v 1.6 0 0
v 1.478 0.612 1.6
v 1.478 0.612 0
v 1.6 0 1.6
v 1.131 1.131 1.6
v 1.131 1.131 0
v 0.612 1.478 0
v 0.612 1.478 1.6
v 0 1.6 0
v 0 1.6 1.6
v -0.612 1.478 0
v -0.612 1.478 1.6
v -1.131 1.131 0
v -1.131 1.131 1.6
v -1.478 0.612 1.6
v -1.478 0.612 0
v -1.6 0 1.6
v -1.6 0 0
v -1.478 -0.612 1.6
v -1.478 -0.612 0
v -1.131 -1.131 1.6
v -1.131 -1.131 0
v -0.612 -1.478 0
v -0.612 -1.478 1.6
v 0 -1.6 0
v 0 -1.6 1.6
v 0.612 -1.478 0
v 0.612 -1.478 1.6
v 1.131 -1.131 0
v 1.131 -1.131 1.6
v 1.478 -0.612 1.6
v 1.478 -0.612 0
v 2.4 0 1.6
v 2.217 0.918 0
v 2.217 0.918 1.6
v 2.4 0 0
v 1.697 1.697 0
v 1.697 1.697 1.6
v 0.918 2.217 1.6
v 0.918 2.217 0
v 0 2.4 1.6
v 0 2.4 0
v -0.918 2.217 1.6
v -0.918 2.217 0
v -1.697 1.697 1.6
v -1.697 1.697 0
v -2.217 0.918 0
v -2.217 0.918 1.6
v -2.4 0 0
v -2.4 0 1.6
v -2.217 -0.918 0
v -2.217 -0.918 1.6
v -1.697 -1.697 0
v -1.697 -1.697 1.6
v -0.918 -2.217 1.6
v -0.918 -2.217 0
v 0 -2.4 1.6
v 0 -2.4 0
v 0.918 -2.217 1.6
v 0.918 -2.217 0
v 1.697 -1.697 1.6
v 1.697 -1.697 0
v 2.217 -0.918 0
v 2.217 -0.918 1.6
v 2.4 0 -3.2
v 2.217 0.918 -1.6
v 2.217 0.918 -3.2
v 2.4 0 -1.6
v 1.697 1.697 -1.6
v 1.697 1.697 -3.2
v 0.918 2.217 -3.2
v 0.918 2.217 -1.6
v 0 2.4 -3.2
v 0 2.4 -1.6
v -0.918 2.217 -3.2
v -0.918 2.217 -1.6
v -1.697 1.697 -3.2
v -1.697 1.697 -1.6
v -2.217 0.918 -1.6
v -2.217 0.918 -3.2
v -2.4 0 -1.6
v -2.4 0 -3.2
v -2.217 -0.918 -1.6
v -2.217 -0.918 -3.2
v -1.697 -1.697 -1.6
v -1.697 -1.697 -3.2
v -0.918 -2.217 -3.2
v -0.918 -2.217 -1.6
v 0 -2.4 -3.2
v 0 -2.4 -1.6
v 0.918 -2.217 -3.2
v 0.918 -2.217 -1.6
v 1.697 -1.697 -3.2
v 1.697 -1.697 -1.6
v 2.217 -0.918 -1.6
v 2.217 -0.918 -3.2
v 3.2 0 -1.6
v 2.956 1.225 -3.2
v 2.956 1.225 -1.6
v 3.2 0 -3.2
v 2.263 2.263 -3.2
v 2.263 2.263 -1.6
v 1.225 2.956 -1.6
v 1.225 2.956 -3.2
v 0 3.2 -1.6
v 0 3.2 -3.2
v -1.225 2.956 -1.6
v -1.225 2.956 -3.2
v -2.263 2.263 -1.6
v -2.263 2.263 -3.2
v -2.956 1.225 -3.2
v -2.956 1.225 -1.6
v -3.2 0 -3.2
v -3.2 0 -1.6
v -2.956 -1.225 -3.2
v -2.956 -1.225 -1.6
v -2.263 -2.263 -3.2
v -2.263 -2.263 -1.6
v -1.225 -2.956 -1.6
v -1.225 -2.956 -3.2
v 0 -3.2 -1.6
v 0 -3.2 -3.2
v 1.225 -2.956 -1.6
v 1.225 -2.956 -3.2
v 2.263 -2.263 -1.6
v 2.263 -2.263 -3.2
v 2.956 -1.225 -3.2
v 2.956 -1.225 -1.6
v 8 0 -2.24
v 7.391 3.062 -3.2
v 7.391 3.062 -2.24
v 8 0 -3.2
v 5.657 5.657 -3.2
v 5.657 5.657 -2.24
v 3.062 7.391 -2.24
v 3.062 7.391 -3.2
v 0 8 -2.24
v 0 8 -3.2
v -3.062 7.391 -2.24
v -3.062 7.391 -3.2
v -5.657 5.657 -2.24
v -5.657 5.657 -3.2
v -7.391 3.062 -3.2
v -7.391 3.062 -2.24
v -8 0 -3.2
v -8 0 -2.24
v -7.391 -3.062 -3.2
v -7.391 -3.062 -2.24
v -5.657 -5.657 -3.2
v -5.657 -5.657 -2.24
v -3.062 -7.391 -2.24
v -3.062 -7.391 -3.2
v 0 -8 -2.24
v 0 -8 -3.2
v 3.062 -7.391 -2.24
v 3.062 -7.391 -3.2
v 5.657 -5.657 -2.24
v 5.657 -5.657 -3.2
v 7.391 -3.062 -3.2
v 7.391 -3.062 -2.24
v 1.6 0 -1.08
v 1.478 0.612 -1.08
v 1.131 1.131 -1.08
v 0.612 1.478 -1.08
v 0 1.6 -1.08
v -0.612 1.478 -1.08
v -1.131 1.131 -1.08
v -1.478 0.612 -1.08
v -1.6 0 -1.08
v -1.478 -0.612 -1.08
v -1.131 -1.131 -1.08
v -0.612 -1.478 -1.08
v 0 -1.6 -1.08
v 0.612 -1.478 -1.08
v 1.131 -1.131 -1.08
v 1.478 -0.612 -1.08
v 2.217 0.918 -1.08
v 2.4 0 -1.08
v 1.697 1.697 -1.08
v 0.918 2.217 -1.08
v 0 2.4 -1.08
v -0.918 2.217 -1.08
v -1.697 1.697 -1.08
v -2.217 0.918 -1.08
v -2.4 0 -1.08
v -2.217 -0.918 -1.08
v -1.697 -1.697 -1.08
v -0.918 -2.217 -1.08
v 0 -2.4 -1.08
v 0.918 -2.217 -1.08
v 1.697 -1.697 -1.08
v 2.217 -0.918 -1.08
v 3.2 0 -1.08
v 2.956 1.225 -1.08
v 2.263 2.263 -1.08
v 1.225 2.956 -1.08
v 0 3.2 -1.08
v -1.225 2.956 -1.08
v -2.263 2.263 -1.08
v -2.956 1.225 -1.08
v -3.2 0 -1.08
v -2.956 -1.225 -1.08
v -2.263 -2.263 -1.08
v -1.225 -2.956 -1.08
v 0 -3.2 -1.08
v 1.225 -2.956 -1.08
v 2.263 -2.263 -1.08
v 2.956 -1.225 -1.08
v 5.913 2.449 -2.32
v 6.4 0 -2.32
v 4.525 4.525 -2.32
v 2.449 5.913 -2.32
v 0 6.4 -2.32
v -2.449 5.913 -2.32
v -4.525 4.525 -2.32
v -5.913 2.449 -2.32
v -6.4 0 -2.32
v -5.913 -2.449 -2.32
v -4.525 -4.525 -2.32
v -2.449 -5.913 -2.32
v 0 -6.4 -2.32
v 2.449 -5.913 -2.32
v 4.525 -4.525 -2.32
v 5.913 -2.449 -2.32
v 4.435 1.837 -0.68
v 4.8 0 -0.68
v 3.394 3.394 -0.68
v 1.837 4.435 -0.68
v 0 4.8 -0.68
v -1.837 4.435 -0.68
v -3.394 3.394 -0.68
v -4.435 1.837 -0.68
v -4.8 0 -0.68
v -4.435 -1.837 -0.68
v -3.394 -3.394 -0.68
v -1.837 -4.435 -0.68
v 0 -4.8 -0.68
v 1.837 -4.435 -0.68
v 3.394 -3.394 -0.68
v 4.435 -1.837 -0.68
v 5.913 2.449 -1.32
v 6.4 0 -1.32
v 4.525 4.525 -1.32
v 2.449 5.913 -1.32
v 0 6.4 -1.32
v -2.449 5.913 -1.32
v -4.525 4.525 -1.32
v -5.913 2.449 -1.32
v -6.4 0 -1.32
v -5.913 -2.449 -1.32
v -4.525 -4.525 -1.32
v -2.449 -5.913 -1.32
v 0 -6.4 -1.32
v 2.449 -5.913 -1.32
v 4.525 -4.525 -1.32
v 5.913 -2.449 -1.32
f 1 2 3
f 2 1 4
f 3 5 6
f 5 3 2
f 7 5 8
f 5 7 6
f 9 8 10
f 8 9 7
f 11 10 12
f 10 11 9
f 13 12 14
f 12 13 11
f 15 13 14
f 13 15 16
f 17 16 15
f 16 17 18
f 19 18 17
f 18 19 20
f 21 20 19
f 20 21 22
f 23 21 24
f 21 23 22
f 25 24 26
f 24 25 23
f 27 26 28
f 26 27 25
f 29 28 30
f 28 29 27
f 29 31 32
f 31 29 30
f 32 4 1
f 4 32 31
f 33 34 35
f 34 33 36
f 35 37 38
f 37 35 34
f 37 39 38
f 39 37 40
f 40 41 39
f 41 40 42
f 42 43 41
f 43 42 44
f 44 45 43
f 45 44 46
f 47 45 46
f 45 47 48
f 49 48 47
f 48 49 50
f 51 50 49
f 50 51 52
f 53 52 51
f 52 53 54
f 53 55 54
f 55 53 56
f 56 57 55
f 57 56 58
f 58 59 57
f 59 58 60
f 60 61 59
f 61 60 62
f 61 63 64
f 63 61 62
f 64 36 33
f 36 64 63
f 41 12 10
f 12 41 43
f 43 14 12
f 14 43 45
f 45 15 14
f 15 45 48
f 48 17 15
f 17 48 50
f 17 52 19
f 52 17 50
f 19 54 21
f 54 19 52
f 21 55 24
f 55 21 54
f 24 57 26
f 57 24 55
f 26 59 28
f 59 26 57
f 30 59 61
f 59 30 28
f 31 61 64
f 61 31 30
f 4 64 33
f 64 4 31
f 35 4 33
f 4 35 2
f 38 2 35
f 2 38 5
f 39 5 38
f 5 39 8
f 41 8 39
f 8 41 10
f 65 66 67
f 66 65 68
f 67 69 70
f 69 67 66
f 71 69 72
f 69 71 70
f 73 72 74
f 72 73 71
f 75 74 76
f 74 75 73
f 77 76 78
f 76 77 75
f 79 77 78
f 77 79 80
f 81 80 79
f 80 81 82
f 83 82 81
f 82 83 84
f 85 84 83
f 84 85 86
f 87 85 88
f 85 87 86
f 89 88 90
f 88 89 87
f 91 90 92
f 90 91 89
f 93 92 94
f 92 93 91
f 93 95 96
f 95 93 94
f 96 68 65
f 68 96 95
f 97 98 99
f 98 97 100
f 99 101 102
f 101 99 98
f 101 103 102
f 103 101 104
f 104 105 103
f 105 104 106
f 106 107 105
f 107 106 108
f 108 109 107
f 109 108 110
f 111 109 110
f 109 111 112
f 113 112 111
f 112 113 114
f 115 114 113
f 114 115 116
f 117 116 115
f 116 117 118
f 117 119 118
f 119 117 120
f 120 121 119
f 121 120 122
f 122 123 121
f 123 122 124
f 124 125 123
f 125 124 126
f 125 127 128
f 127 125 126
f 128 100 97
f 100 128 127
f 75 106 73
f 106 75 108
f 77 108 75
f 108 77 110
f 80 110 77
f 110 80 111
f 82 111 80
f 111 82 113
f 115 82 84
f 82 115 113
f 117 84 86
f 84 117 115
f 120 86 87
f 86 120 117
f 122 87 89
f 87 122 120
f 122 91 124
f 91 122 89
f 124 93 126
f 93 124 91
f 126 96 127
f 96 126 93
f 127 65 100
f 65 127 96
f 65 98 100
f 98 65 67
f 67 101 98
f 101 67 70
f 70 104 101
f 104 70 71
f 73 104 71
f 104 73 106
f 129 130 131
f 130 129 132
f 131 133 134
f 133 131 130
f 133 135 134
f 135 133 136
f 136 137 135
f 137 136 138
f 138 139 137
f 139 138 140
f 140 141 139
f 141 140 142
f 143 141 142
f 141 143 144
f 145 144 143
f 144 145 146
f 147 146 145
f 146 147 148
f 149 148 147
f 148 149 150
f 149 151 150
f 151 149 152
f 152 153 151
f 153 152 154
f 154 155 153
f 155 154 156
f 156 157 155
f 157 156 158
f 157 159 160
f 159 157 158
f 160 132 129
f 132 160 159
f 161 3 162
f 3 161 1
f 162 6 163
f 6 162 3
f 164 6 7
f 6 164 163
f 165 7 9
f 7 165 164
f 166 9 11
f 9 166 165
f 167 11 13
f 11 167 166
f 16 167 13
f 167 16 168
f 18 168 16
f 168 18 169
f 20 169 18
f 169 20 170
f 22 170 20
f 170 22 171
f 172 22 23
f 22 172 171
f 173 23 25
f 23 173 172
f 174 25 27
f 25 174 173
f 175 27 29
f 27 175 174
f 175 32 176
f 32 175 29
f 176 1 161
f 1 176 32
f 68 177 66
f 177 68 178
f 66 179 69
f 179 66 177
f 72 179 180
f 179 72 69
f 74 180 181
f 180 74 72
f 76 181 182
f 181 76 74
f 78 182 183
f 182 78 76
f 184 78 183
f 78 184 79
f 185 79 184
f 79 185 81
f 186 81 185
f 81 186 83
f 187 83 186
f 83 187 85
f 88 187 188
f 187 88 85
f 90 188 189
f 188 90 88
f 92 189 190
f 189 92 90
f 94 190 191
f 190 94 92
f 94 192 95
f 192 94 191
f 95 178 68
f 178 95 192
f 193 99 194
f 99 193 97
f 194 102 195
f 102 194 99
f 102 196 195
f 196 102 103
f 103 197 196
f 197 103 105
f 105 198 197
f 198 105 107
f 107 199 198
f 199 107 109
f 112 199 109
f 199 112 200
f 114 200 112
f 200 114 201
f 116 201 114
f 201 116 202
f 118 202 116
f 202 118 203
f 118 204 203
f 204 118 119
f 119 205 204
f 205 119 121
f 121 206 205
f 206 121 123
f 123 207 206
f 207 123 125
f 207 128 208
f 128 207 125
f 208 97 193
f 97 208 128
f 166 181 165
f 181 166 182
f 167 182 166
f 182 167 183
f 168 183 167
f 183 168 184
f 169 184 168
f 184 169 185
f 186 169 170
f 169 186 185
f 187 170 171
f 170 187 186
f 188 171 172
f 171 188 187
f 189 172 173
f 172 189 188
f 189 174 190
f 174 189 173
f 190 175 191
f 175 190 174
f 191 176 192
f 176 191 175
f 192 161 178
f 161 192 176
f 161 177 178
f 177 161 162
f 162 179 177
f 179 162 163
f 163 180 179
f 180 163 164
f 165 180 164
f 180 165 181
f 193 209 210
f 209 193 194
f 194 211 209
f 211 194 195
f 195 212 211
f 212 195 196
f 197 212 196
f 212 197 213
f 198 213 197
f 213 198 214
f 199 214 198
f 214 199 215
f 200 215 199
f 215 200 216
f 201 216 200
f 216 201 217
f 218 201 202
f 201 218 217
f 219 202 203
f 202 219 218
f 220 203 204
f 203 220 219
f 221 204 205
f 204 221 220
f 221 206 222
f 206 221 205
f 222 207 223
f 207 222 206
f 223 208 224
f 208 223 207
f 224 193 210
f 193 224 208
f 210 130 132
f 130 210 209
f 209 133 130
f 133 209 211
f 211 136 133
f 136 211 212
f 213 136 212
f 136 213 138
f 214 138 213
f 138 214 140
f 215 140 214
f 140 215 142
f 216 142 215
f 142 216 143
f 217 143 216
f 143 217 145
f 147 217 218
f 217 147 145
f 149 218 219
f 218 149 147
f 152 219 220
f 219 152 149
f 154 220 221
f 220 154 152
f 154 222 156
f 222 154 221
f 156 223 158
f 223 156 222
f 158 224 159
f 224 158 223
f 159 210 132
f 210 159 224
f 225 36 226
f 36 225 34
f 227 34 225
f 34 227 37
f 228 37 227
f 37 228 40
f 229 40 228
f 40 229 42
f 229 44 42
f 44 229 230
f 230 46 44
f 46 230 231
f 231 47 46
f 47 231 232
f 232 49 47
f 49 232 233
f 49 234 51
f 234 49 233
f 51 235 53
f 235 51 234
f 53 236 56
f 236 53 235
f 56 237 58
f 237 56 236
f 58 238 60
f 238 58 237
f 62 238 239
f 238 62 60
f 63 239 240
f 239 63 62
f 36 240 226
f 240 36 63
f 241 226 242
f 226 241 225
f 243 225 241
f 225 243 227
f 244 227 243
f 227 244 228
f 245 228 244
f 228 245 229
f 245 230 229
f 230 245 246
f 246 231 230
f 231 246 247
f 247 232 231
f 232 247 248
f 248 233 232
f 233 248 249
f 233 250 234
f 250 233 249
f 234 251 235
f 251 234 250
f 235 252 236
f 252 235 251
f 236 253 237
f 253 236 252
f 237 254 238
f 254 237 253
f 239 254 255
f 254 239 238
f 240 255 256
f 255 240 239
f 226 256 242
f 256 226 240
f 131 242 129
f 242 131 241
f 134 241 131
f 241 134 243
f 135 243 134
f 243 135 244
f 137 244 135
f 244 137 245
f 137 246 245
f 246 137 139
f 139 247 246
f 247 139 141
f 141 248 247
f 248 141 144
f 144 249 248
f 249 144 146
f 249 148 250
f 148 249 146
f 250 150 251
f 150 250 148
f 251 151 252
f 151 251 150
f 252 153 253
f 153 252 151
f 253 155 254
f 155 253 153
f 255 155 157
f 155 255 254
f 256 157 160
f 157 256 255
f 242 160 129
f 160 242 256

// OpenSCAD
use <../lib.scad>
use <4740.scad>
function ldraw_lib__17964() = [
// 0 =Dish  2 x  2 Inverted
// 0 Name: 17964.dat
// 0 Author: [PTadmin]
// 0 !LDRAW_ORG Part Alias UPDATE 2025-09
// 0 !LICENSE Licensed under CC BY 4.0 : see CAreadme.txt
// 
// 0 BFC CERTIFY CCW
  [0,"BFC","CERTIFY"],
  [0,"BFC","CCW"],
// 
// 0 !KEYWORDS BrickLink 4740, Rebrickable 4740
// 
// 0 !HISTORY 2017-12-30 [PTadmin] Official Update 2017-01
// 0 !HISTORY 2025-09-27 [OrionP] Changed winding to CCW
// 0 !HISTORY 2025-09-29 [OrionP] Official Update 2025-09
// 
// 0 // Alias of 4740
// 0 // Part 17974 is the metallic ink counterpart of 4740
// 
// 1 16 0 0 0 1 0 0 0 1 0 0 0 1 4740.dat
  [1,16,0,0,0,1,0,0,0,1,0,0,0,1, ldraw_lib__4740()],
// 0
];
module ldraw_lib__17964(step=0, col=false, unit=2/5, alt=false, line=0.2, solid=!$preview)
    makepoly(ldraw_lib__17964(), step=step, col=col, unit=unit, alt=alt, line=line, solid=solid);
ldraw_lib__17964(line=0.2);
